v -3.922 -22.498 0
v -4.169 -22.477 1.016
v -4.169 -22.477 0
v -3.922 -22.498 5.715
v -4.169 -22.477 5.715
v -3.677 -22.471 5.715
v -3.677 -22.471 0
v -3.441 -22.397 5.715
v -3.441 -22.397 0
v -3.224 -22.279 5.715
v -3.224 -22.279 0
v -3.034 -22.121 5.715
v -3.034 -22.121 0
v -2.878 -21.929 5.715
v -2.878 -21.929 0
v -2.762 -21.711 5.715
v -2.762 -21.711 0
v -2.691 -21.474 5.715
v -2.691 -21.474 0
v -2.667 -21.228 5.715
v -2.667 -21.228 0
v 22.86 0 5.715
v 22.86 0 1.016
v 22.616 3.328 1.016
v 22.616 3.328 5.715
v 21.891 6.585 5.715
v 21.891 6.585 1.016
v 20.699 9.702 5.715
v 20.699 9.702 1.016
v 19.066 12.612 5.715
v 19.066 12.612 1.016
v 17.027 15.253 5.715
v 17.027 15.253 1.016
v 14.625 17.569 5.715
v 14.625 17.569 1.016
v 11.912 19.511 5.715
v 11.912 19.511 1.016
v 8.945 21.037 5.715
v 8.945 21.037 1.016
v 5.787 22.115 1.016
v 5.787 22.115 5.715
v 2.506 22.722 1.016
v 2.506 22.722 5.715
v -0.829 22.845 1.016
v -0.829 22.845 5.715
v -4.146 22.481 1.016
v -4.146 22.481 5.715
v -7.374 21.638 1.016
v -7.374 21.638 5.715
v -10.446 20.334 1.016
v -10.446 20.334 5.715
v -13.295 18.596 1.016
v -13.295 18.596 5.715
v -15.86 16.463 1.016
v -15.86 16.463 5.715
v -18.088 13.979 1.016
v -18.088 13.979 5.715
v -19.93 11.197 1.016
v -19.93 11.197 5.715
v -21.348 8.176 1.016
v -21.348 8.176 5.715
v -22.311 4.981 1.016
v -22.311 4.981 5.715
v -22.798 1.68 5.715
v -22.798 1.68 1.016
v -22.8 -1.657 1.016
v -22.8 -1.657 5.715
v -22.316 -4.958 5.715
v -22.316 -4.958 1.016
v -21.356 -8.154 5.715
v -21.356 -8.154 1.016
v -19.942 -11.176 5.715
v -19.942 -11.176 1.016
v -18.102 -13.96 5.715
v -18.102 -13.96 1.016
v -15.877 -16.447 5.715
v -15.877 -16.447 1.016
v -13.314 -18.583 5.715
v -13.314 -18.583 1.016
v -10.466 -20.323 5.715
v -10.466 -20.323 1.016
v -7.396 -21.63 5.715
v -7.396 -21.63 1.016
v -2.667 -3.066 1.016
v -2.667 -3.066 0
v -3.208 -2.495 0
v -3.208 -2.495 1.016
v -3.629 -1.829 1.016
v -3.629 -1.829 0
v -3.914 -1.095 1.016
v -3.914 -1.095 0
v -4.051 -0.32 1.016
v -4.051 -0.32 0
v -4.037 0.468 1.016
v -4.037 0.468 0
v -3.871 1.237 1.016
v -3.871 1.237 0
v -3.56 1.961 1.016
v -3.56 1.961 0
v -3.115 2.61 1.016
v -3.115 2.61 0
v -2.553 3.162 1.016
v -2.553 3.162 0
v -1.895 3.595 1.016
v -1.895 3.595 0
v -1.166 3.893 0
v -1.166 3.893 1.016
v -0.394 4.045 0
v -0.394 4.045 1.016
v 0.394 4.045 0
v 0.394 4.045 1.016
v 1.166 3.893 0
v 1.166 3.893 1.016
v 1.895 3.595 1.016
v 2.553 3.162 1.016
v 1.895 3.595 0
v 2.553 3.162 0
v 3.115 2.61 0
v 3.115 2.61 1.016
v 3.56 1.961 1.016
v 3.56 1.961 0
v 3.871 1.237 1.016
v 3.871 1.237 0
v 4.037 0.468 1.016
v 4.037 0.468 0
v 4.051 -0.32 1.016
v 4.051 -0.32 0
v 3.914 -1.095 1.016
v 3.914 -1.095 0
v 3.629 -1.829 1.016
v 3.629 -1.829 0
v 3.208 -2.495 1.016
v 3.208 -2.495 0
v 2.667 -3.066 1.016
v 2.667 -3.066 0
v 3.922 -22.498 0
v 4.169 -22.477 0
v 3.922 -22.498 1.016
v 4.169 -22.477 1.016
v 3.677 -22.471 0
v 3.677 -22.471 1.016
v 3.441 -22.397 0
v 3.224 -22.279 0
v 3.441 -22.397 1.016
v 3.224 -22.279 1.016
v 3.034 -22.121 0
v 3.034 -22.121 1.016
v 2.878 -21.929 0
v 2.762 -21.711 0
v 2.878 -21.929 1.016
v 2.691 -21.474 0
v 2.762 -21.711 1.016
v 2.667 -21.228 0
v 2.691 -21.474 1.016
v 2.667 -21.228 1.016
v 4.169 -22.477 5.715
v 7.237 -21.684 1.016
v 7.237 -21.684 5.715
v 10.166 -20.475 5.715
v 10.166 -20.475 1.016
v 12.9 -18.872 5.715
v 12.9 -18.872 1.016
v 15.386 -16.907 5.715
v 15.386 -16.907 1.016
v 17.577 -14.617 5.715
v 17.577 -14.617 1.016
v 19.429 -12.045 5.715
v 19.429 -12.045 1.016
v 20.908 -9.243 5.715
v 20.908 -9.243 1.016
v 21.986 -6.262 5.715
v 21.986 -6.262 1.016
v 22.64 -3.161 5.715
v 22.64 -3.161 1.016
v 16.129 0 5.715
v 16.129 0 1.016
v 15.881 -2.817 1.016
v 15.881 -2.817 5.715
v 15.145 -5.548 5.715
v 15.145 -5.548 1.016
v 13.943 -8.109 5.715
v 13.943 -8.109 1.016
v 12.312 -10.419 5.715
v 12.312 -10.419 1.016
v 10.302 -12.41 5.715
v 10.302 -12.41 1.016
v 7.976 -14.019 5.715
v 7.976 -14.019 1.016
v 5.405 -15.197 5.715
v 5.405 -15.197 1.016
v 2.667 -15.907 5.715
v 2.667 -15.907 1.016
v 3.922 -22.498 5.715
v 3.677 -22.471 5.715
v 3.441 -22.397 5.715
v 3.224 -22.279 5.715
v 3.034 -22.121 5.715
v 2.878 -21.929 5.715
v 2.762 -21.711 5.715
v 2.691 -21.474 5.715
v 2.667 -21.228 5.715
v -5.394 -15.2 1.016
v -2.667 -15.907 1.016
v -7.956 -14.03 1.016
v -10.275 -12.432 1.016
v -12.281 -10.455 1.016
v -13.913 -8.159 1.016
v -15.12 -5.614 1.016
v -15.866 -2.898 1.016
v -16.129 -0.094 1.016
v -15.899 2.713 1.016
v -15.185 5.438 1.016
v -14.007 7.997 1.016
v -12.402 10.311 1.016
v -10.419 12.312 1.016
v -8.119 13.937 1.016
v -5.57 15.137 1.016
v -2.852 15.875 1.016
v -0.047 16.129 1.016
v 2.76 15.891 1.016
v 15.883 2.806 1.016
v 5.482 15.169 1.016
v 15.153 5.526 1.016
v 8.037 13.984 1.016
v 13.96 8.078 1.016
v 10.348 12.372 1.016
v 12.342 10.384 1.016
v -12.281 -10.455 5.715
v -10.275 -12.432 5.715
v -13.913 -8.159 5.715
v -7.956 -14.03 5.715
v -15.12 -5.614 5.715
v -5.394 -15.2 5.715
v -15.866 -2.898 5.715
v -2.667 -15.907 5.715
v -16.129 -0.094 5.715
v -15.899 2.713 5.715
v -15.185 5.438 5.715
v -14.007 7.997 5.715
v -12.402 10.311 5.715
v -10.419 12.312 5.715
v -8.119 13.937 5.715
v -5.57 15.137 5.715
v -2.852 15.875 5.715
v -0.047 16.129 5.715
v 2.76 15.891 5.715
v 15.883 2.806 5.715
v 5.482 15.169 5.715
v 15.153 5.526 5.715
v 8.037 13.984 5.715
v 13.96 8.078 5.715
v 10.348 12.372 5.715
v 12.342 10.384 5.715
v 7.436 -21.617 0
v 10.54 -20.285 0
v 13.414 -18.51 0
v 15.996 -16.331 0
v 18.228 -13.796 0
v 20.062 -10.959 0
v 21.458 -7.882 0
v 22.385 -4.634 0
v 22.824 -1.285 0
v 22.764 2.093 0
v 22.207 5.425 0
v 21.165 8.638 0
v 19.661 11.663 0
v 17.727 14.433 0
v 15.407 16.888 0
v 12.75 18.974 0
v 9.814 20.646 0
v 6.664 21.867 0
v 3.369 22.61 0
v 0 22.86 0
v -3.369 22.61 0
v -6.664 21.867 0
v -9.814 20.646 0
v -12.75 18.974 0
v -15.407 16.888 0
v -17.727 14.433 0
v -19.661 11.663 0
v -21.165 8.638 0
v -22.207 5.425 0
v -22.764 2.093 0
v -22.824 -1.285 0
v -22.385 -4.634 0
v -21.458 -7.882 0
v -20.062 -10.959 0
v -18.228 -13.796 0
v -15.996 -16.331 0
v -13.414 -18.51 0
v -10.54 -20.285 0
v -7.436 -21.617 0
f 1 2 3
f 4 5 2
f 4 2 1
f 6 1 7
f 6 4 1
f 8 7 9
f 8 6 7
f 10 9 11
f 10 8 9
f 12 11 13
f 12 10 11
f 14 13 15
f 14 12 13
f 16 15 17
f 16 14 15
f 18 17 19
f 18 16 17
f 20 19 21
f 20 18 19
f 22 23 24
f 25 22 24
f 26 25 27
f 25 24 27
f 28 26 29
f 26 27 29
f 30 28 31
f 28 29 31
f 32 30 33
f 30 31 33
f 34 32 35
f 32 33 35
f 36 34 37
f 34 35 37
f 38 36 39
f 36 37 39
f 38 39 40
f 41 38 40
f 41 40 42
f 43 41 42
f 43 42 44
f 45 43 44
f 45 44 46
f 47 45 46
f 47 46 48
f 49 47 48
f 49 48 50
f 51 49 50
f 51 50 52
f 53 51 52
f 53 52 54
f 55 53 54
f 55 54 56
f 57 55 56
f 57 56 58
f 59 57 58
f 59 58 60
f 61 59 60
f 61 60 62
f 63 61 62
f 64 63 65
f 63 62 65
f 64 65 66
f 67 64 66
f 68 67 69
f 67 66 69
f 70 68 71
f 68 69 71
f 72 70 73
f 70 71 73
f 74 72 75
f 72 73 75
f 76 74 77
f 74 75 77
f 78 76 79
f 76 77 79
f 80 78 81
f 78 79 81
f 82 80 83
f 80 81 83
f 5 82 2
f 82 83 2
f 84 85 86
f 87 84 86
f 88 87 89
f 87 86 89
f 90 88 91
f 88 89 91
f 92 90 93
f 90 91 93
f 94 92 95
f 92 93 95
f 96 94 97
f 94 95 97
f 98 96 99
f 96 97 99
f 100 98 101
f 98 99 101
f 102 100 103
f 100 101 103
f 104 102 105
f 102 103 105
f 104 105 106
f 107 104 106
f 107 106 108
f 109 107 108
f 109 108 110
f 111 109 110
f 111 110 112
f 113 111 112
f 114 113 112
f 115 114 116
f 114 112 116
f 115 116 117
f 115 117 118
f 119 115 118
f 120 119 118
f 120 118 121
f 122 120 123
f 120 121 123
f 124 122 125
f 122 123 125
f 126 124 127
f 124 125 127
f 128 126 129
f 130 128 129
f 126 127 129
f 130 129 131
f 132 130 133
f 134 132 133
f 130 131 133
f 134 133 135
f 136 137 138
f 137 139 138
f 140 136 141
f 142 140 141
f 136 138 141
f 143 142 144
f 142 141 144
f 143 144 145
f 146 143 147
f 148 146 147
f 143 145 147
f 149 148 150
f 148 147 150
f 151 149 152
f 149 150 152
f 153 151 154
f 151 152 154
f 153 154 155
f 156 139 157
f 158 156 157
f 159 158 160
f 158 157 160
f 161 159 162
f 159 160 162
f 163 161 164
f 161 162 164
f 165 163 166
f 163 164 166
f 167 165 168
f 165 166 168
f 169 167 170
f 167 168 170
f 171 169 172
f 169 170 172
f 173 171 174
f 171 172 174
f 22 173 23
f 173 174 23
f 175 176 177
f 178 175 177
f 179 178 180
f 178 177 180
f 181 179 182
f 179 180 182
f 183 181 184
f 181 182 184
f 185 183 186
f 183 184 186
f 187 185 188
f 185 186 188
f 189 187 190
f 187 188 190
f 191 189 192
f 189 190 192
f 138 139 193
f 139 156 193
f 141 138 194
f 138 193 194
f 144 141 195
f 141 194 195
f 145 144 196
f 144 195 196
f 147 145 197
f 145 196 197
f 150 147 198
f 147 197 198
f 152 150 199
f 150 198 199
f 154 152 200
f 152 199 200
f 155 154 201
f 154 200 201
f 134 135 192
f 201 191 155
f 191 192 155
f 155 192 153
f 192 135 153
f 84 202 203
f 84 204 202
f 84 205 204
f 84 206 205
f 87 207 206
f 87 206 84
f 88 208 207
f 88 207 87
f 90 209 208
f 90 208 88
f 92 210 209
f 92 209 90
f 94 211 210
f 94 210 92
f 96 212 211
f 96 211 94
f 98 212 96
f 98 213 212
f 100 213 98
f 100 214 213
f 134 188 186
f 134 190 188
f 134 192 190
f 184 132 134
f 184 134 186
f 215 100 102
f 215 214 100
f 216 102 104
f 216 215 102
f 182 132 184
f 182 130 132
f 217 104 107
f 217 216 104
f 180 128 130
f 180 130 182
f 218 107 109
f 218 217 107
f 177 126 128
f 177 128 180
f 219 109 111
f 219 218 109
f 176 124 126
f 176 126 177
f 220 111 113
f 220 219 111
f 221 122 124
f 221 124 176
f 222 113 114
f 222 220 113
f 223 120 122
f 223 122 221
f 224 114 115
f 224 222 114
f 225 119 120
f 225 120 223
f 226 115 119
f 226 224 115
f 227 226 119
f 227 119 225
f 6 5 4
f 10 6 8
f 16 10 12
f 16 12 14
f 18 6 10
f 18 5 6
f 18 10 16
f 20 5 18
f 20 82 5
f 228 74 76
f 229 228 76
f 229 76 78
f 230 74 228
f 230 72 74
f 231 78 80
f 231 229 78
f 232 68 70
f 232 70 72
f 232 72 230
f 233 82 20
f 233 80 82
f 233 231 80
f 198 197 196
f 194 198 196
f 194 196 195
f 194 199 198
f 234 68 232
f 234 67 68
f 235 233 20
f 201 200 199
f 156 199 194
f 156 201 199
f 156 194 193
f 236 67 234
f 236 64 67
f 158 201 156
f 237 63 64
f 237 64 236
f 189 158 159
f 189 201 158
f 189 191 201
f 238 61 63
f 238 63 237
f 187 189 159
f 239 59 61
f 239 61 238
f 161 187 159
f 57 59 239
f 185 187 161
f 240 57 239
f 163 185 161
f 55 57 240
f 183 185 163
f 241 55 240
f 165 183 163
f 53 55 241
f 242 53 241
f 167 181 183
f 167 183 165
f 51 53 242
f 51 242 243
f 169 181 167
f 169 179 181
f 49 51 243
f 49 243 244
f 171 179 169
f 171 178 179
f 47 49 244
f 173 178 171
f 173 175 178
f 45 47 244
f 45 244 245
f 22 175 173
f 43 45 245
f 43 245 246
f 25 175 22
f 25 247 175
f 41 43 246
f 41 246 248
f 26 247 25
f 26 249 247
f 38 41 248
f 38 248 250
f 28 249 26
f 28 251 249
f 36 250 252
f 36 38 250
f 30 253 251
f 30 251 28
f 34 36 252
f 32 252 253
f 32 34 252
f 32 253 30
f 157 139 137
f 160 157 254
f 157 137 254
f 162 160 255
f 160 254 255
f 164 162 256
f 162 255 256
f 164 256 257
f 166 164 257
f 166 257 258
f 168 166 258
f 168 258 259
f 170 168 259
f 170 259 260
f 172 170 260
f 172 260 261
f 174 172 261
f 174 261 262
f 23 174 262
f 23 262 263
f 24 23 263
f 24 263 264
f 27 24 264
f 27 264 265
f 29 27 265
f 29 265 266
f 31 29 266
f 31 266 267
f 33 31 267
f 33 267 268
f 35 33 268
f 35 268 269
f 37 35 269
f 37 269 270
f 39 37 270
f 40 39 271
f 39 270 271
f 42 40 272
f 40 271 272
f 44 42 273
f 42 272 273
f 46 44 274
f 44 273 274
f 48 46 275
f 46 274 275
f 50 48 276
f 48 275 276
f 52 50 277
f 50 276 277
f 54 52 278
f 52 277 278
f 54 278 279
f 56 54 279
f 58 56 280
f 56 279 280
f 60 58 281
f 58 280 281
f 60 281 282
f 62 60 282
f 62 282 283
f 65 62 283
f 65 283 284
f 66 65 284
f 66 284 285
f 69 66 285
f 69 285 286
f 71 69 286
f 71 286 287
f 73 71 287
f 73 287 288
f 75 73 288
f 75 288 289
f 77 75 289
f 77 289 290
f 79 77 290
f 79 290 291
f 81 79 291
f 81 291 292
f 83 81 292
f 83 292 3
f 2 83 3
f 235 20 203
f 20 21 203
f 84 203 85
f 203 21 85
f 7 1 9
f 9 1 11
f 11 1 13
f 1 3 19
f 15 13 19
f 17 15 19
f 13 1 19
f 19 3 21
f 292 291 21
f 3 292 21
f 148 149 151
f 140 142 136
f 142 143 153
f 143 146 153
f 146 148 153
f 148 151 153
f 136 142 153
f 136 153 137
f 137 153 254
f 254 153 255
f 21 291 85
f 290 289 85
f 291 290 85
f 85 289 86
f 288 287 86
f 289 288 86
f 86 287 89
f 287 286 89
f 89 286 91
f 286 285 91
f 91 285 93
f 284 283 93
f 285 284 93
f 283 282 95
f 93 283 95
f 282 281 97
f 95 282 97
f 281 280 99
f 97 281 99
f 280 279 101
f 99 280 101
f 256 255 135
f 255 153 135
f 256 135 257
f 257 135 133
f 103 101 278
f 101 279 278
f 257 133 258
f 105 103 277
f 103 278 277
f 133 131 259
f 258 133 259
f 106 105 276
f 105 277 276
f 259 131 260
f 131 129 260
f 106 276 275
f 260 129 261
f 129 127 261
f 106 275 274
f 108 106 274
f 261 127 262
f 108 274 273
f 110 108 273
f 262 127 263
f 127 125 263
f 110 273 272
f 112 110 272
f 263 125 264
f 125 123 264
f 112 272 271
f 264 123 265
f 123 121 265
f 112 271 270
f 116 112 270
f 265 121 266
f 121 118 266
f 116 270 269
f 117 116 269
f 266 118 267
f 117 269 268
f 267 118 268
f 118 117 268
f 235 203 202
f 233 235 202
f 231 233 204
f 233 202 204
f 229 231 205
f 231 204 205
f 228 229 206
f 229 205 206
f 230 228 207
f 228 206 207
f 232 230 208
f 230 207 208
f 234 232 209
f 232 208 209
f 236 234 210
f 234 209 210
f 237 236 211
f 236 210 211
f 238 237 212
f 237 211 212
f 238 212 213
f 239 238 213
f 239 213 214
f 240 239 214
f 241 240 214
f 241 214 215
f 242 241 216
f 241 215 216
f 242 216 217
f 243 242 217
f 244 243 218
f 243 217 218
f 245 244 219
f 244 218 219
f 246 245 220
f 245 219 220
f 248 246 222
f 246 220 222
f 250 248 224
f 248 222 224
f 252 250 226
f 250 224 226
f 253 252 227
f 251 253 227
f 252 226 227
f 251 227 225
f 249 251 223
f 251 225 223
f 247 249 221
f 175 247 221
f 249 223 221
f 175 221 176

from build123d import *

# Parameters (mm, degrees)
F1_DEPTH = 1.016
F3_DEPTH = 4.699
F4_R     = 1.27


with BuildPart() as f1:
    # F0 (on Top) → F1 (new body)
    with BuildSketch(Plane.XY):
        with BuildLine():
            ThreePointArc((-2.667, -3.0664649028), (0, 4.064), (2.667, -3.0664649028))
            Line((2.667, -3.0664649028), (2.667, -22.7038919791))
            ThreePointArc((2.667, -22.7038919791), (0, 22.86), (-2.667, -22.7038919791))
            Line((-2.667, -22.7038919791), (-2.667, -3.0664649028))
        make_face()
    extrude(amount=F1_DEPTH)

    # F2 (on face) → F3 (join)
    with BuildSketch(Plane.XY.offset(1.016)):
        with BuildLine():
            ThreePointArc((2.667, -22.7038919791), (17.0813819699, -15.1923003525), (22.86, 0))
            ThreePointArc((22.86, 0), (-15.1923003525, 17.0813819699), (-2.667, -22.7038919791))
            Line((-2.667, -22.7038919791), (-2.667, -15.9069718048))
            ThreePointArc((-2.667, -15.9069718048), (-10.4194193216, 12.3117968632), (16.129, 0))
            ThreePointArc((16.129, 0), (12.3117968632, -10.4194193216), (2.667, -15.9069718048))
            Line((2.667, -15.9069718048), (2.667, -22.7038919791))
        make_face()
    extrude(amount=F3_DEPTH)

    # F4
    f4_edges = [f1.edges().sort_by_distance(p)[0] for p in [
        (-2.667, -22.703892, 2.8575),
        (2.667, -22.703892, 2.8575),
    ]]
    fillet(f4_edges, radius=F4_R)


solid = f1.part
